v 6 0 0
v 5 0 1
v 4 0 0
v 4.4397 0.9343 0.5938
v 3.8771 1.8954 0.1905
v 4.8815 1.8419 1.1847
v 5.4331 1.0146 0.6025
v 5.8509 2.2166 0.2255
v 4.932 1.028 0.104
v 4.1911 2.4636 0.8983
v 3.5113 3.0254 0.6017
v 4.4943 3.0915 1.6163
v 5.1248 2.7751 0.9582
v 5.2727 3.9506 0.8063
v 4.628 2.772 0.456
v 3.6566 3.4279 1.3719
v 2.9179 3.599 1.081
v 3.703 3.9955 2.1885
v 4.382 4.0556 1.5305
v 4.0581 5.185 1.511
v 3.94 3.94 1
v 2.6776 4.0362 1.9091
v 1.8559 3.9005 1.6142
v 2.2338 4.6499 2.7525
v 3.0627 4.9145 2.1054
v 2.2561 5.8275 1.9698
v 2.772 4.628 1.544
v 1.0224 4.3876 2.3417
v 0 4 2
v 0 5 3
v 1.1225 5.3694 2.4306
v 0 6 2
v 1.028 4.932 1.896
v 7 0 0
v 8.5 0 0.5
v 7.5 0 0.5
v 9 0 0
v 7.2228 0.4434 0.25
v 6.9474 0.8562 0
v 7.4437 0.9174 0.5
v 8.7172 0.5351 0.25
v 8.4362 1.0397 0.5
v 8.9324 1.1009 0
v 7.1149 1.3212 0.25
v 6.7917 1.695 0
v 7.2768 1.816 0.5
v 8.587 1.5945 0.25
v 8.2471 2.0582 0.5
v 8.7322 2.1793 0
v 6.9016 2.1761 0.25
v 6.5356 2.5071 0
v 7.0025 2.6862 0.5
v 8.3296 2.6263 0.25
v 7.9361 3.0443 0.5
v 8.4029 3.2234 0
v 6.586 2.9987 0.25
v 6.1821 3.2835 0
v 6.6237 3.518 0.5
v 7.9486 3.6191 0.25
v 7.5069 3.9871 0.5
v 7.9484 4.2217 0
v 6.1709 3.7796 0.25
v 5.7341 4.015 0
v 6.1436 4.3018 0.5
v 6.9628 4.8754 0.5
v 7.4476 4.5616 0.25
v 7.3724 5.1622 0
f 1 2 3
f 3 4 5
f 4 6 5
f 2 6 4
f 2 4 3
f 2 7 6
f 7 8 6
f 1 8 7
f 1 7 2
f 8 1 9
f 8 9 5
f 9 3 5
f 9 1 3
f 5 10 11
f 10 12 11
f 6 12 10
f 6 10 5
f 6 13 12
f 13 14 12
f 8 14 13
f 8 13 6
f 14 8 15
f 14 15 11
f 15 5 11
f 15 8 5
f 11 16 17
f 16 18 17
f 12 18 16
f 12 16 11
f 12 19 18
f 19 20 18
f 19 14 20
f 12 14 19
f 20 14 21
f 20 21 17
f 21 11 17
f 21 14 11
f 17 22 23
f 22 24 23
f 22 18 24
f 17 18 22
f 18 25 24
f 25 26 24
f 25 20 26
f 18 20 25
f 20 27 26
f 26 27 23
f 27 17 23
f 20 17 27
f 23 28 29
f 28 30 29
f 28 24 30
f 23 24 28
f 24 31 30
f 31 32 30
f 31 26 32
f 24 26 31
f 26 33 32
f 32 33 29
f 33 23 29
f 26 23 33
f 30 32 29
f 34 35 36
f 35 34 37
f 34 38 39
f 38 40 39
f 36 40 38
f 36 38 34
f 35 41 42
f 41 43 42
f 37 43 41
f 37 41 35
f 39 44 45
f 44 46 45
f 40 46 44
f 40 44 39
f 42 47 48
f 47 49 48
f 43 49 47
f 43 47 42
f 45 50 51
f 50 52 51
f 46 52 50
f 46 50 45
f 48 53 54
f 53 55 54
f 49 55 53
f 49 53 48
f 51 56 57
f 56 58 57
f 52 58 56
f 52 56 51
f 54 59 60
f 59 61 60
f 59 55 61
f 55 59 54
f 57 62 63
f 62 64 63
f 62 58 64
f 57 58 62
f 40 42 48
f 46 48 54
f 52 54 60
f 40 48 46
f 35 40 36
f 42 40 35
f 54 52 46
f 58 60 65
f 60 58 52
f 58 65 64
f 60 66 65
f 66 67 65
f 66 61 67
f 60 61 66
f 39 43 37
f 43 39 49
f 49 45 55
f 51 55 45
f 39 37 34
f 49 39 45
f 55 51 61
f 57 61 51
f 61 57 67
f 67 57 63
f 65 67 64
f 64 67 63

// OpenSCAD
// Extrusion along a path, including bezier path.

function revface(f, offset=0) =
  [ for (i=[0:1:len(f)-1]) [for(j=[len(f[i])-1:-1:0]) f[i][j] + offset ] ];
function endface(numpts, e) = len(e) ? e : [ [for (i=[0:1:numpts-1]) i] ];

// numslices should be odd

function shiftpoints(points, numpts, numslices) =
  [ for (i=[0:1:numslices-1])
    for (j=[0:1:numpts-1])
    (i%2)==0 ? points[i*numpts + j] :
     numslices > 20 ?
     // ensure "center points" are on a slice
     (( points[i*numpts + j] + points[i*numpts + ((j+1) % numpts)] ) / 2 ) :
     // interpolate between the surrounding slices
     // (works better when numslices is very small)
     (( points[(i-1)*numpts + j] + points[(i-1)*numpts + ((j+1) % numpts)] +
        points[(i+1)*numpts + j] + points[(i+1)*numpts + ((j+1) % numpts)] ) / 4 ) ];

function genfaces(numpts, numslices, end=[]) = concat(
  endface(numpts, end),
  genfaces_interior(numpts, numslices),
  revface(endface(numpts, end), numpts*(numslices - 1))
);

function genfaces_interior(numpts, numslices) = [
  for (i=[0:2:numslices-3])
    for (j=[0:1:numpts-1])
      for (k=[0,1,2,3])
        [ i * numpts, i * numpts, i * numpts ] +
        (k == 0 ?
          [ numpts + j, 0 + j, 2*numpts + j ] :
         k == 1 ?
          [ numpts + j, 2*numpts + j, 2*numpts + (j + 1) % numpts ] :
         k == 2 ?
          [ numpts + j, 2*numpts + (j + 1) % numpts, (j + 1) % numpts ] :
          [ numpts + j, (j + 1) % numpts, 0 + j ])
];

function rotate_matx(theta) = [
  [ 1,          0,           0, 0],
  [ 0, cos(theta), -sin(theta), 0],
  [ 0, sin(theta),  cos(theta), 0],
  [ 0,          0,           0, 1]
];
function rotate_maty(theta) = [
  [  cos(theta), 0, sin(theta), 0],
  [           0, 1,          0, 0],
  [ -sin(theta), 0, cos(theta), 0],
  [           0, 0,          0, 1]
];
function rotate_matz(theta) = [
  [ cos(theta), -sin(theta), 0, 0],
  [ sin(theta),  cos(theta), 0, 0],
  [          0,           0, 1, 0],
  [          0,           0, 0, 1]
];
function rotate_mat(amt) =
  rotate_matz(amt.z) * rotate_maty(amt.y) * rotate_matx(amt.x);
function trans_mat(amt) = [
  [ 1, 0, 0, amt.x ],
  [ 0, 1, 0, amt.y ],
  [ 0, 0, 1, amt.z ],
  [ 0, 0, 0, 1 ]
];
function affineT(mat, v) = mat * [v.x, v.y, v.z, 1];
function affine(mat, v) = let (r=affineT(mat, v)) [for (i=[0,1,2]) r[i]];
function affine2(mat, v) = let (r=mat * [v.x, v.y, 0, 1]) [r.x, r.y];

// Bezier math, from: https://pomax.github.io/bezierinfo/
function bezier_at(pts, t) =
  pow(1-t,3)*pts[0] +
  3*pow(1-t,2)*t*pts[1] +
  3*(1-t)*pow(t,2)*pts[2] +
  pow(t,3)*pts[3];
function bezier_dt_at(pts, t) =
  3*pow(1-t,2)*(pts[1]-pts[0]) +
  6*(1-t)*t*(pts[2]-pts[1]) +
  3*pow(t,2)*(pts[3]-pts[2]);
function unit_vector(p) = p / norm(p);
function bezier_unit_tangent_at(pts, t) = unit_vector(bezier_dt_at(pts, t));

function bezier_divide1(pts, z=0.5) = [
  pts[0],
  z*pts[1] - (z-1)*pts[0],
  pow(z,2)*pts[2] - 2*z*(z-1)*pts[1] + pow(z-1,2)*pts[0],
  pow(z,3)*pts[3] - 3*pow(z,2)*(z-1)*pts[2] + 3*z*pow(z-1,2)*pts[1] - pow(z-1,3)*pts[0]
];
function bezier_divide2(pts, z=0.5) = [
  pow(z,3)*pts[3] - 3*pow(z,2)*(z-1)*pts[2] + 3*z*pow(z-1,2)*pts[1] - pow(z-1,3)*pts[0],
  pow(z,2)*pts[3] - 2*z*(z-1)*pts[2] + pow(z-1,2)*pts[1],
  z*pts[3] - (z-1)*pts[2],
  pts[3]
];

function bezier_arclength(pts, thresh=1) =
  norm(pts[3]-pts[0]) < thresh ? norm(pts[3] - pts[0]) :
  (bezier_arclength(bezier_divide1(pts), thresh) +
   bezier_arclength(bezier_divide2(pts), thresh));

// return the t value corresponding to a given arclength
function bezier_t_for_length(pts, length, thresh=1) =
  norm(pts[3]-pts[0]) < thresh ? (length/norm(pts[3] - pts[0])) :
  let(div1=bezier_divide1(pts), len1=bezier_arclength(div1, thresh))
  len1 > length ?
  (bezier_t_for_length(div1, length, thresh)/2) :
  (0.5 + bezier_t_for_length(bezier_divide2(pts), length-len1, thresh)/2);


// https://pomax.github.io/bezierinfo/#circles_cubic
function bezier_arc(radius, angle) =
  let(f=4*tan(angle/4)/3) [
  [ radius, 0, 0 ],
  [ radius, radius*f, 0],
  [ radius*(cos(angle) + f*sin(angle)),
    radius*(sin(angle) - f*cos(angle)), 0],
  [ radius*cos(angle), radius*sin(angle), 0]
];

// Compute rotation matrix from two vectors.
// From: http://math.stackexchange.com/questions/180418/calculate-rotation-matrix-to-align-vector-a-to-vector-b-in-3d

function rotate_from2vec_int(v) =
  [[0, -v[2], v[1]], [v[2], 0, -v[0]], [-v[1], v[0], 0]];
function rotate_from2vec(v1, v2) =
  let(cross=cross(v1, v2), vx=rotate_from2vec_int(cross),
      c=v1*v2, s=norm(cross))
  ([[1, 0, 0], [0, 1, 0], [0, 0, 1]] + vx + vx*vx*(1-c)/(s != 0 ? s*s : 1));

function mat3tomat4(M) = [
  concat(M[0], [0]),
  concat(M[1], [0]),
  concat(M[2], [0]),
  [ 0, 0, 0, 1 ]
];

module bezier_extrude(profile_points, bezier_points, endface=[], slices=$fn, initial_vec=undef) {
  // ensure #slices is odd
  nslices = 1 + 2*floor((slices <= 0 ? 13 : slices) / 2);
  // initial direction and position
  d0 = initial_vec == undef ? bezier_unit_tangent_at(bezier_points, 0) :
    initial_vec;
  points = [ for (i=[0:1:nslices-1]) for (j=[0:1:len(profile_points)-1])
    bezier_at(bezier_points, i/(nslices-1)) +
    rotate_from2vec(d0, bezier_unit_tangent_at(bezier_points, i/(nslices-1))) *
    profile_points[j]
  ];
  //echo(nslices=nslices,d0=d0,points=points);
  polyhedron(points=shiftpoints(points, len(profile_points), nslices),
             faces=genfaces(len(profile_points), nslices, endface));
}

// test!
sample_line_bezier =[[0,0,0],[0,1,0],[0,2,0],[0,3,0]];
sample_curve_bezier = [[5,0,0],[5,4,0],[4,5,2],[0,5,2]];
sample_arc_bezier = bezier_arc(8, 35);
bezier_extrude([[-1,0,0],[0,0,1],[1,0,0]], sample_curve_bezier, slices=10);

bezier_extrude([[-1,0,0],[-.5,0,.5],[.5,0,.5],[1,0,0]], sample_arc_bezier, slices=10);
